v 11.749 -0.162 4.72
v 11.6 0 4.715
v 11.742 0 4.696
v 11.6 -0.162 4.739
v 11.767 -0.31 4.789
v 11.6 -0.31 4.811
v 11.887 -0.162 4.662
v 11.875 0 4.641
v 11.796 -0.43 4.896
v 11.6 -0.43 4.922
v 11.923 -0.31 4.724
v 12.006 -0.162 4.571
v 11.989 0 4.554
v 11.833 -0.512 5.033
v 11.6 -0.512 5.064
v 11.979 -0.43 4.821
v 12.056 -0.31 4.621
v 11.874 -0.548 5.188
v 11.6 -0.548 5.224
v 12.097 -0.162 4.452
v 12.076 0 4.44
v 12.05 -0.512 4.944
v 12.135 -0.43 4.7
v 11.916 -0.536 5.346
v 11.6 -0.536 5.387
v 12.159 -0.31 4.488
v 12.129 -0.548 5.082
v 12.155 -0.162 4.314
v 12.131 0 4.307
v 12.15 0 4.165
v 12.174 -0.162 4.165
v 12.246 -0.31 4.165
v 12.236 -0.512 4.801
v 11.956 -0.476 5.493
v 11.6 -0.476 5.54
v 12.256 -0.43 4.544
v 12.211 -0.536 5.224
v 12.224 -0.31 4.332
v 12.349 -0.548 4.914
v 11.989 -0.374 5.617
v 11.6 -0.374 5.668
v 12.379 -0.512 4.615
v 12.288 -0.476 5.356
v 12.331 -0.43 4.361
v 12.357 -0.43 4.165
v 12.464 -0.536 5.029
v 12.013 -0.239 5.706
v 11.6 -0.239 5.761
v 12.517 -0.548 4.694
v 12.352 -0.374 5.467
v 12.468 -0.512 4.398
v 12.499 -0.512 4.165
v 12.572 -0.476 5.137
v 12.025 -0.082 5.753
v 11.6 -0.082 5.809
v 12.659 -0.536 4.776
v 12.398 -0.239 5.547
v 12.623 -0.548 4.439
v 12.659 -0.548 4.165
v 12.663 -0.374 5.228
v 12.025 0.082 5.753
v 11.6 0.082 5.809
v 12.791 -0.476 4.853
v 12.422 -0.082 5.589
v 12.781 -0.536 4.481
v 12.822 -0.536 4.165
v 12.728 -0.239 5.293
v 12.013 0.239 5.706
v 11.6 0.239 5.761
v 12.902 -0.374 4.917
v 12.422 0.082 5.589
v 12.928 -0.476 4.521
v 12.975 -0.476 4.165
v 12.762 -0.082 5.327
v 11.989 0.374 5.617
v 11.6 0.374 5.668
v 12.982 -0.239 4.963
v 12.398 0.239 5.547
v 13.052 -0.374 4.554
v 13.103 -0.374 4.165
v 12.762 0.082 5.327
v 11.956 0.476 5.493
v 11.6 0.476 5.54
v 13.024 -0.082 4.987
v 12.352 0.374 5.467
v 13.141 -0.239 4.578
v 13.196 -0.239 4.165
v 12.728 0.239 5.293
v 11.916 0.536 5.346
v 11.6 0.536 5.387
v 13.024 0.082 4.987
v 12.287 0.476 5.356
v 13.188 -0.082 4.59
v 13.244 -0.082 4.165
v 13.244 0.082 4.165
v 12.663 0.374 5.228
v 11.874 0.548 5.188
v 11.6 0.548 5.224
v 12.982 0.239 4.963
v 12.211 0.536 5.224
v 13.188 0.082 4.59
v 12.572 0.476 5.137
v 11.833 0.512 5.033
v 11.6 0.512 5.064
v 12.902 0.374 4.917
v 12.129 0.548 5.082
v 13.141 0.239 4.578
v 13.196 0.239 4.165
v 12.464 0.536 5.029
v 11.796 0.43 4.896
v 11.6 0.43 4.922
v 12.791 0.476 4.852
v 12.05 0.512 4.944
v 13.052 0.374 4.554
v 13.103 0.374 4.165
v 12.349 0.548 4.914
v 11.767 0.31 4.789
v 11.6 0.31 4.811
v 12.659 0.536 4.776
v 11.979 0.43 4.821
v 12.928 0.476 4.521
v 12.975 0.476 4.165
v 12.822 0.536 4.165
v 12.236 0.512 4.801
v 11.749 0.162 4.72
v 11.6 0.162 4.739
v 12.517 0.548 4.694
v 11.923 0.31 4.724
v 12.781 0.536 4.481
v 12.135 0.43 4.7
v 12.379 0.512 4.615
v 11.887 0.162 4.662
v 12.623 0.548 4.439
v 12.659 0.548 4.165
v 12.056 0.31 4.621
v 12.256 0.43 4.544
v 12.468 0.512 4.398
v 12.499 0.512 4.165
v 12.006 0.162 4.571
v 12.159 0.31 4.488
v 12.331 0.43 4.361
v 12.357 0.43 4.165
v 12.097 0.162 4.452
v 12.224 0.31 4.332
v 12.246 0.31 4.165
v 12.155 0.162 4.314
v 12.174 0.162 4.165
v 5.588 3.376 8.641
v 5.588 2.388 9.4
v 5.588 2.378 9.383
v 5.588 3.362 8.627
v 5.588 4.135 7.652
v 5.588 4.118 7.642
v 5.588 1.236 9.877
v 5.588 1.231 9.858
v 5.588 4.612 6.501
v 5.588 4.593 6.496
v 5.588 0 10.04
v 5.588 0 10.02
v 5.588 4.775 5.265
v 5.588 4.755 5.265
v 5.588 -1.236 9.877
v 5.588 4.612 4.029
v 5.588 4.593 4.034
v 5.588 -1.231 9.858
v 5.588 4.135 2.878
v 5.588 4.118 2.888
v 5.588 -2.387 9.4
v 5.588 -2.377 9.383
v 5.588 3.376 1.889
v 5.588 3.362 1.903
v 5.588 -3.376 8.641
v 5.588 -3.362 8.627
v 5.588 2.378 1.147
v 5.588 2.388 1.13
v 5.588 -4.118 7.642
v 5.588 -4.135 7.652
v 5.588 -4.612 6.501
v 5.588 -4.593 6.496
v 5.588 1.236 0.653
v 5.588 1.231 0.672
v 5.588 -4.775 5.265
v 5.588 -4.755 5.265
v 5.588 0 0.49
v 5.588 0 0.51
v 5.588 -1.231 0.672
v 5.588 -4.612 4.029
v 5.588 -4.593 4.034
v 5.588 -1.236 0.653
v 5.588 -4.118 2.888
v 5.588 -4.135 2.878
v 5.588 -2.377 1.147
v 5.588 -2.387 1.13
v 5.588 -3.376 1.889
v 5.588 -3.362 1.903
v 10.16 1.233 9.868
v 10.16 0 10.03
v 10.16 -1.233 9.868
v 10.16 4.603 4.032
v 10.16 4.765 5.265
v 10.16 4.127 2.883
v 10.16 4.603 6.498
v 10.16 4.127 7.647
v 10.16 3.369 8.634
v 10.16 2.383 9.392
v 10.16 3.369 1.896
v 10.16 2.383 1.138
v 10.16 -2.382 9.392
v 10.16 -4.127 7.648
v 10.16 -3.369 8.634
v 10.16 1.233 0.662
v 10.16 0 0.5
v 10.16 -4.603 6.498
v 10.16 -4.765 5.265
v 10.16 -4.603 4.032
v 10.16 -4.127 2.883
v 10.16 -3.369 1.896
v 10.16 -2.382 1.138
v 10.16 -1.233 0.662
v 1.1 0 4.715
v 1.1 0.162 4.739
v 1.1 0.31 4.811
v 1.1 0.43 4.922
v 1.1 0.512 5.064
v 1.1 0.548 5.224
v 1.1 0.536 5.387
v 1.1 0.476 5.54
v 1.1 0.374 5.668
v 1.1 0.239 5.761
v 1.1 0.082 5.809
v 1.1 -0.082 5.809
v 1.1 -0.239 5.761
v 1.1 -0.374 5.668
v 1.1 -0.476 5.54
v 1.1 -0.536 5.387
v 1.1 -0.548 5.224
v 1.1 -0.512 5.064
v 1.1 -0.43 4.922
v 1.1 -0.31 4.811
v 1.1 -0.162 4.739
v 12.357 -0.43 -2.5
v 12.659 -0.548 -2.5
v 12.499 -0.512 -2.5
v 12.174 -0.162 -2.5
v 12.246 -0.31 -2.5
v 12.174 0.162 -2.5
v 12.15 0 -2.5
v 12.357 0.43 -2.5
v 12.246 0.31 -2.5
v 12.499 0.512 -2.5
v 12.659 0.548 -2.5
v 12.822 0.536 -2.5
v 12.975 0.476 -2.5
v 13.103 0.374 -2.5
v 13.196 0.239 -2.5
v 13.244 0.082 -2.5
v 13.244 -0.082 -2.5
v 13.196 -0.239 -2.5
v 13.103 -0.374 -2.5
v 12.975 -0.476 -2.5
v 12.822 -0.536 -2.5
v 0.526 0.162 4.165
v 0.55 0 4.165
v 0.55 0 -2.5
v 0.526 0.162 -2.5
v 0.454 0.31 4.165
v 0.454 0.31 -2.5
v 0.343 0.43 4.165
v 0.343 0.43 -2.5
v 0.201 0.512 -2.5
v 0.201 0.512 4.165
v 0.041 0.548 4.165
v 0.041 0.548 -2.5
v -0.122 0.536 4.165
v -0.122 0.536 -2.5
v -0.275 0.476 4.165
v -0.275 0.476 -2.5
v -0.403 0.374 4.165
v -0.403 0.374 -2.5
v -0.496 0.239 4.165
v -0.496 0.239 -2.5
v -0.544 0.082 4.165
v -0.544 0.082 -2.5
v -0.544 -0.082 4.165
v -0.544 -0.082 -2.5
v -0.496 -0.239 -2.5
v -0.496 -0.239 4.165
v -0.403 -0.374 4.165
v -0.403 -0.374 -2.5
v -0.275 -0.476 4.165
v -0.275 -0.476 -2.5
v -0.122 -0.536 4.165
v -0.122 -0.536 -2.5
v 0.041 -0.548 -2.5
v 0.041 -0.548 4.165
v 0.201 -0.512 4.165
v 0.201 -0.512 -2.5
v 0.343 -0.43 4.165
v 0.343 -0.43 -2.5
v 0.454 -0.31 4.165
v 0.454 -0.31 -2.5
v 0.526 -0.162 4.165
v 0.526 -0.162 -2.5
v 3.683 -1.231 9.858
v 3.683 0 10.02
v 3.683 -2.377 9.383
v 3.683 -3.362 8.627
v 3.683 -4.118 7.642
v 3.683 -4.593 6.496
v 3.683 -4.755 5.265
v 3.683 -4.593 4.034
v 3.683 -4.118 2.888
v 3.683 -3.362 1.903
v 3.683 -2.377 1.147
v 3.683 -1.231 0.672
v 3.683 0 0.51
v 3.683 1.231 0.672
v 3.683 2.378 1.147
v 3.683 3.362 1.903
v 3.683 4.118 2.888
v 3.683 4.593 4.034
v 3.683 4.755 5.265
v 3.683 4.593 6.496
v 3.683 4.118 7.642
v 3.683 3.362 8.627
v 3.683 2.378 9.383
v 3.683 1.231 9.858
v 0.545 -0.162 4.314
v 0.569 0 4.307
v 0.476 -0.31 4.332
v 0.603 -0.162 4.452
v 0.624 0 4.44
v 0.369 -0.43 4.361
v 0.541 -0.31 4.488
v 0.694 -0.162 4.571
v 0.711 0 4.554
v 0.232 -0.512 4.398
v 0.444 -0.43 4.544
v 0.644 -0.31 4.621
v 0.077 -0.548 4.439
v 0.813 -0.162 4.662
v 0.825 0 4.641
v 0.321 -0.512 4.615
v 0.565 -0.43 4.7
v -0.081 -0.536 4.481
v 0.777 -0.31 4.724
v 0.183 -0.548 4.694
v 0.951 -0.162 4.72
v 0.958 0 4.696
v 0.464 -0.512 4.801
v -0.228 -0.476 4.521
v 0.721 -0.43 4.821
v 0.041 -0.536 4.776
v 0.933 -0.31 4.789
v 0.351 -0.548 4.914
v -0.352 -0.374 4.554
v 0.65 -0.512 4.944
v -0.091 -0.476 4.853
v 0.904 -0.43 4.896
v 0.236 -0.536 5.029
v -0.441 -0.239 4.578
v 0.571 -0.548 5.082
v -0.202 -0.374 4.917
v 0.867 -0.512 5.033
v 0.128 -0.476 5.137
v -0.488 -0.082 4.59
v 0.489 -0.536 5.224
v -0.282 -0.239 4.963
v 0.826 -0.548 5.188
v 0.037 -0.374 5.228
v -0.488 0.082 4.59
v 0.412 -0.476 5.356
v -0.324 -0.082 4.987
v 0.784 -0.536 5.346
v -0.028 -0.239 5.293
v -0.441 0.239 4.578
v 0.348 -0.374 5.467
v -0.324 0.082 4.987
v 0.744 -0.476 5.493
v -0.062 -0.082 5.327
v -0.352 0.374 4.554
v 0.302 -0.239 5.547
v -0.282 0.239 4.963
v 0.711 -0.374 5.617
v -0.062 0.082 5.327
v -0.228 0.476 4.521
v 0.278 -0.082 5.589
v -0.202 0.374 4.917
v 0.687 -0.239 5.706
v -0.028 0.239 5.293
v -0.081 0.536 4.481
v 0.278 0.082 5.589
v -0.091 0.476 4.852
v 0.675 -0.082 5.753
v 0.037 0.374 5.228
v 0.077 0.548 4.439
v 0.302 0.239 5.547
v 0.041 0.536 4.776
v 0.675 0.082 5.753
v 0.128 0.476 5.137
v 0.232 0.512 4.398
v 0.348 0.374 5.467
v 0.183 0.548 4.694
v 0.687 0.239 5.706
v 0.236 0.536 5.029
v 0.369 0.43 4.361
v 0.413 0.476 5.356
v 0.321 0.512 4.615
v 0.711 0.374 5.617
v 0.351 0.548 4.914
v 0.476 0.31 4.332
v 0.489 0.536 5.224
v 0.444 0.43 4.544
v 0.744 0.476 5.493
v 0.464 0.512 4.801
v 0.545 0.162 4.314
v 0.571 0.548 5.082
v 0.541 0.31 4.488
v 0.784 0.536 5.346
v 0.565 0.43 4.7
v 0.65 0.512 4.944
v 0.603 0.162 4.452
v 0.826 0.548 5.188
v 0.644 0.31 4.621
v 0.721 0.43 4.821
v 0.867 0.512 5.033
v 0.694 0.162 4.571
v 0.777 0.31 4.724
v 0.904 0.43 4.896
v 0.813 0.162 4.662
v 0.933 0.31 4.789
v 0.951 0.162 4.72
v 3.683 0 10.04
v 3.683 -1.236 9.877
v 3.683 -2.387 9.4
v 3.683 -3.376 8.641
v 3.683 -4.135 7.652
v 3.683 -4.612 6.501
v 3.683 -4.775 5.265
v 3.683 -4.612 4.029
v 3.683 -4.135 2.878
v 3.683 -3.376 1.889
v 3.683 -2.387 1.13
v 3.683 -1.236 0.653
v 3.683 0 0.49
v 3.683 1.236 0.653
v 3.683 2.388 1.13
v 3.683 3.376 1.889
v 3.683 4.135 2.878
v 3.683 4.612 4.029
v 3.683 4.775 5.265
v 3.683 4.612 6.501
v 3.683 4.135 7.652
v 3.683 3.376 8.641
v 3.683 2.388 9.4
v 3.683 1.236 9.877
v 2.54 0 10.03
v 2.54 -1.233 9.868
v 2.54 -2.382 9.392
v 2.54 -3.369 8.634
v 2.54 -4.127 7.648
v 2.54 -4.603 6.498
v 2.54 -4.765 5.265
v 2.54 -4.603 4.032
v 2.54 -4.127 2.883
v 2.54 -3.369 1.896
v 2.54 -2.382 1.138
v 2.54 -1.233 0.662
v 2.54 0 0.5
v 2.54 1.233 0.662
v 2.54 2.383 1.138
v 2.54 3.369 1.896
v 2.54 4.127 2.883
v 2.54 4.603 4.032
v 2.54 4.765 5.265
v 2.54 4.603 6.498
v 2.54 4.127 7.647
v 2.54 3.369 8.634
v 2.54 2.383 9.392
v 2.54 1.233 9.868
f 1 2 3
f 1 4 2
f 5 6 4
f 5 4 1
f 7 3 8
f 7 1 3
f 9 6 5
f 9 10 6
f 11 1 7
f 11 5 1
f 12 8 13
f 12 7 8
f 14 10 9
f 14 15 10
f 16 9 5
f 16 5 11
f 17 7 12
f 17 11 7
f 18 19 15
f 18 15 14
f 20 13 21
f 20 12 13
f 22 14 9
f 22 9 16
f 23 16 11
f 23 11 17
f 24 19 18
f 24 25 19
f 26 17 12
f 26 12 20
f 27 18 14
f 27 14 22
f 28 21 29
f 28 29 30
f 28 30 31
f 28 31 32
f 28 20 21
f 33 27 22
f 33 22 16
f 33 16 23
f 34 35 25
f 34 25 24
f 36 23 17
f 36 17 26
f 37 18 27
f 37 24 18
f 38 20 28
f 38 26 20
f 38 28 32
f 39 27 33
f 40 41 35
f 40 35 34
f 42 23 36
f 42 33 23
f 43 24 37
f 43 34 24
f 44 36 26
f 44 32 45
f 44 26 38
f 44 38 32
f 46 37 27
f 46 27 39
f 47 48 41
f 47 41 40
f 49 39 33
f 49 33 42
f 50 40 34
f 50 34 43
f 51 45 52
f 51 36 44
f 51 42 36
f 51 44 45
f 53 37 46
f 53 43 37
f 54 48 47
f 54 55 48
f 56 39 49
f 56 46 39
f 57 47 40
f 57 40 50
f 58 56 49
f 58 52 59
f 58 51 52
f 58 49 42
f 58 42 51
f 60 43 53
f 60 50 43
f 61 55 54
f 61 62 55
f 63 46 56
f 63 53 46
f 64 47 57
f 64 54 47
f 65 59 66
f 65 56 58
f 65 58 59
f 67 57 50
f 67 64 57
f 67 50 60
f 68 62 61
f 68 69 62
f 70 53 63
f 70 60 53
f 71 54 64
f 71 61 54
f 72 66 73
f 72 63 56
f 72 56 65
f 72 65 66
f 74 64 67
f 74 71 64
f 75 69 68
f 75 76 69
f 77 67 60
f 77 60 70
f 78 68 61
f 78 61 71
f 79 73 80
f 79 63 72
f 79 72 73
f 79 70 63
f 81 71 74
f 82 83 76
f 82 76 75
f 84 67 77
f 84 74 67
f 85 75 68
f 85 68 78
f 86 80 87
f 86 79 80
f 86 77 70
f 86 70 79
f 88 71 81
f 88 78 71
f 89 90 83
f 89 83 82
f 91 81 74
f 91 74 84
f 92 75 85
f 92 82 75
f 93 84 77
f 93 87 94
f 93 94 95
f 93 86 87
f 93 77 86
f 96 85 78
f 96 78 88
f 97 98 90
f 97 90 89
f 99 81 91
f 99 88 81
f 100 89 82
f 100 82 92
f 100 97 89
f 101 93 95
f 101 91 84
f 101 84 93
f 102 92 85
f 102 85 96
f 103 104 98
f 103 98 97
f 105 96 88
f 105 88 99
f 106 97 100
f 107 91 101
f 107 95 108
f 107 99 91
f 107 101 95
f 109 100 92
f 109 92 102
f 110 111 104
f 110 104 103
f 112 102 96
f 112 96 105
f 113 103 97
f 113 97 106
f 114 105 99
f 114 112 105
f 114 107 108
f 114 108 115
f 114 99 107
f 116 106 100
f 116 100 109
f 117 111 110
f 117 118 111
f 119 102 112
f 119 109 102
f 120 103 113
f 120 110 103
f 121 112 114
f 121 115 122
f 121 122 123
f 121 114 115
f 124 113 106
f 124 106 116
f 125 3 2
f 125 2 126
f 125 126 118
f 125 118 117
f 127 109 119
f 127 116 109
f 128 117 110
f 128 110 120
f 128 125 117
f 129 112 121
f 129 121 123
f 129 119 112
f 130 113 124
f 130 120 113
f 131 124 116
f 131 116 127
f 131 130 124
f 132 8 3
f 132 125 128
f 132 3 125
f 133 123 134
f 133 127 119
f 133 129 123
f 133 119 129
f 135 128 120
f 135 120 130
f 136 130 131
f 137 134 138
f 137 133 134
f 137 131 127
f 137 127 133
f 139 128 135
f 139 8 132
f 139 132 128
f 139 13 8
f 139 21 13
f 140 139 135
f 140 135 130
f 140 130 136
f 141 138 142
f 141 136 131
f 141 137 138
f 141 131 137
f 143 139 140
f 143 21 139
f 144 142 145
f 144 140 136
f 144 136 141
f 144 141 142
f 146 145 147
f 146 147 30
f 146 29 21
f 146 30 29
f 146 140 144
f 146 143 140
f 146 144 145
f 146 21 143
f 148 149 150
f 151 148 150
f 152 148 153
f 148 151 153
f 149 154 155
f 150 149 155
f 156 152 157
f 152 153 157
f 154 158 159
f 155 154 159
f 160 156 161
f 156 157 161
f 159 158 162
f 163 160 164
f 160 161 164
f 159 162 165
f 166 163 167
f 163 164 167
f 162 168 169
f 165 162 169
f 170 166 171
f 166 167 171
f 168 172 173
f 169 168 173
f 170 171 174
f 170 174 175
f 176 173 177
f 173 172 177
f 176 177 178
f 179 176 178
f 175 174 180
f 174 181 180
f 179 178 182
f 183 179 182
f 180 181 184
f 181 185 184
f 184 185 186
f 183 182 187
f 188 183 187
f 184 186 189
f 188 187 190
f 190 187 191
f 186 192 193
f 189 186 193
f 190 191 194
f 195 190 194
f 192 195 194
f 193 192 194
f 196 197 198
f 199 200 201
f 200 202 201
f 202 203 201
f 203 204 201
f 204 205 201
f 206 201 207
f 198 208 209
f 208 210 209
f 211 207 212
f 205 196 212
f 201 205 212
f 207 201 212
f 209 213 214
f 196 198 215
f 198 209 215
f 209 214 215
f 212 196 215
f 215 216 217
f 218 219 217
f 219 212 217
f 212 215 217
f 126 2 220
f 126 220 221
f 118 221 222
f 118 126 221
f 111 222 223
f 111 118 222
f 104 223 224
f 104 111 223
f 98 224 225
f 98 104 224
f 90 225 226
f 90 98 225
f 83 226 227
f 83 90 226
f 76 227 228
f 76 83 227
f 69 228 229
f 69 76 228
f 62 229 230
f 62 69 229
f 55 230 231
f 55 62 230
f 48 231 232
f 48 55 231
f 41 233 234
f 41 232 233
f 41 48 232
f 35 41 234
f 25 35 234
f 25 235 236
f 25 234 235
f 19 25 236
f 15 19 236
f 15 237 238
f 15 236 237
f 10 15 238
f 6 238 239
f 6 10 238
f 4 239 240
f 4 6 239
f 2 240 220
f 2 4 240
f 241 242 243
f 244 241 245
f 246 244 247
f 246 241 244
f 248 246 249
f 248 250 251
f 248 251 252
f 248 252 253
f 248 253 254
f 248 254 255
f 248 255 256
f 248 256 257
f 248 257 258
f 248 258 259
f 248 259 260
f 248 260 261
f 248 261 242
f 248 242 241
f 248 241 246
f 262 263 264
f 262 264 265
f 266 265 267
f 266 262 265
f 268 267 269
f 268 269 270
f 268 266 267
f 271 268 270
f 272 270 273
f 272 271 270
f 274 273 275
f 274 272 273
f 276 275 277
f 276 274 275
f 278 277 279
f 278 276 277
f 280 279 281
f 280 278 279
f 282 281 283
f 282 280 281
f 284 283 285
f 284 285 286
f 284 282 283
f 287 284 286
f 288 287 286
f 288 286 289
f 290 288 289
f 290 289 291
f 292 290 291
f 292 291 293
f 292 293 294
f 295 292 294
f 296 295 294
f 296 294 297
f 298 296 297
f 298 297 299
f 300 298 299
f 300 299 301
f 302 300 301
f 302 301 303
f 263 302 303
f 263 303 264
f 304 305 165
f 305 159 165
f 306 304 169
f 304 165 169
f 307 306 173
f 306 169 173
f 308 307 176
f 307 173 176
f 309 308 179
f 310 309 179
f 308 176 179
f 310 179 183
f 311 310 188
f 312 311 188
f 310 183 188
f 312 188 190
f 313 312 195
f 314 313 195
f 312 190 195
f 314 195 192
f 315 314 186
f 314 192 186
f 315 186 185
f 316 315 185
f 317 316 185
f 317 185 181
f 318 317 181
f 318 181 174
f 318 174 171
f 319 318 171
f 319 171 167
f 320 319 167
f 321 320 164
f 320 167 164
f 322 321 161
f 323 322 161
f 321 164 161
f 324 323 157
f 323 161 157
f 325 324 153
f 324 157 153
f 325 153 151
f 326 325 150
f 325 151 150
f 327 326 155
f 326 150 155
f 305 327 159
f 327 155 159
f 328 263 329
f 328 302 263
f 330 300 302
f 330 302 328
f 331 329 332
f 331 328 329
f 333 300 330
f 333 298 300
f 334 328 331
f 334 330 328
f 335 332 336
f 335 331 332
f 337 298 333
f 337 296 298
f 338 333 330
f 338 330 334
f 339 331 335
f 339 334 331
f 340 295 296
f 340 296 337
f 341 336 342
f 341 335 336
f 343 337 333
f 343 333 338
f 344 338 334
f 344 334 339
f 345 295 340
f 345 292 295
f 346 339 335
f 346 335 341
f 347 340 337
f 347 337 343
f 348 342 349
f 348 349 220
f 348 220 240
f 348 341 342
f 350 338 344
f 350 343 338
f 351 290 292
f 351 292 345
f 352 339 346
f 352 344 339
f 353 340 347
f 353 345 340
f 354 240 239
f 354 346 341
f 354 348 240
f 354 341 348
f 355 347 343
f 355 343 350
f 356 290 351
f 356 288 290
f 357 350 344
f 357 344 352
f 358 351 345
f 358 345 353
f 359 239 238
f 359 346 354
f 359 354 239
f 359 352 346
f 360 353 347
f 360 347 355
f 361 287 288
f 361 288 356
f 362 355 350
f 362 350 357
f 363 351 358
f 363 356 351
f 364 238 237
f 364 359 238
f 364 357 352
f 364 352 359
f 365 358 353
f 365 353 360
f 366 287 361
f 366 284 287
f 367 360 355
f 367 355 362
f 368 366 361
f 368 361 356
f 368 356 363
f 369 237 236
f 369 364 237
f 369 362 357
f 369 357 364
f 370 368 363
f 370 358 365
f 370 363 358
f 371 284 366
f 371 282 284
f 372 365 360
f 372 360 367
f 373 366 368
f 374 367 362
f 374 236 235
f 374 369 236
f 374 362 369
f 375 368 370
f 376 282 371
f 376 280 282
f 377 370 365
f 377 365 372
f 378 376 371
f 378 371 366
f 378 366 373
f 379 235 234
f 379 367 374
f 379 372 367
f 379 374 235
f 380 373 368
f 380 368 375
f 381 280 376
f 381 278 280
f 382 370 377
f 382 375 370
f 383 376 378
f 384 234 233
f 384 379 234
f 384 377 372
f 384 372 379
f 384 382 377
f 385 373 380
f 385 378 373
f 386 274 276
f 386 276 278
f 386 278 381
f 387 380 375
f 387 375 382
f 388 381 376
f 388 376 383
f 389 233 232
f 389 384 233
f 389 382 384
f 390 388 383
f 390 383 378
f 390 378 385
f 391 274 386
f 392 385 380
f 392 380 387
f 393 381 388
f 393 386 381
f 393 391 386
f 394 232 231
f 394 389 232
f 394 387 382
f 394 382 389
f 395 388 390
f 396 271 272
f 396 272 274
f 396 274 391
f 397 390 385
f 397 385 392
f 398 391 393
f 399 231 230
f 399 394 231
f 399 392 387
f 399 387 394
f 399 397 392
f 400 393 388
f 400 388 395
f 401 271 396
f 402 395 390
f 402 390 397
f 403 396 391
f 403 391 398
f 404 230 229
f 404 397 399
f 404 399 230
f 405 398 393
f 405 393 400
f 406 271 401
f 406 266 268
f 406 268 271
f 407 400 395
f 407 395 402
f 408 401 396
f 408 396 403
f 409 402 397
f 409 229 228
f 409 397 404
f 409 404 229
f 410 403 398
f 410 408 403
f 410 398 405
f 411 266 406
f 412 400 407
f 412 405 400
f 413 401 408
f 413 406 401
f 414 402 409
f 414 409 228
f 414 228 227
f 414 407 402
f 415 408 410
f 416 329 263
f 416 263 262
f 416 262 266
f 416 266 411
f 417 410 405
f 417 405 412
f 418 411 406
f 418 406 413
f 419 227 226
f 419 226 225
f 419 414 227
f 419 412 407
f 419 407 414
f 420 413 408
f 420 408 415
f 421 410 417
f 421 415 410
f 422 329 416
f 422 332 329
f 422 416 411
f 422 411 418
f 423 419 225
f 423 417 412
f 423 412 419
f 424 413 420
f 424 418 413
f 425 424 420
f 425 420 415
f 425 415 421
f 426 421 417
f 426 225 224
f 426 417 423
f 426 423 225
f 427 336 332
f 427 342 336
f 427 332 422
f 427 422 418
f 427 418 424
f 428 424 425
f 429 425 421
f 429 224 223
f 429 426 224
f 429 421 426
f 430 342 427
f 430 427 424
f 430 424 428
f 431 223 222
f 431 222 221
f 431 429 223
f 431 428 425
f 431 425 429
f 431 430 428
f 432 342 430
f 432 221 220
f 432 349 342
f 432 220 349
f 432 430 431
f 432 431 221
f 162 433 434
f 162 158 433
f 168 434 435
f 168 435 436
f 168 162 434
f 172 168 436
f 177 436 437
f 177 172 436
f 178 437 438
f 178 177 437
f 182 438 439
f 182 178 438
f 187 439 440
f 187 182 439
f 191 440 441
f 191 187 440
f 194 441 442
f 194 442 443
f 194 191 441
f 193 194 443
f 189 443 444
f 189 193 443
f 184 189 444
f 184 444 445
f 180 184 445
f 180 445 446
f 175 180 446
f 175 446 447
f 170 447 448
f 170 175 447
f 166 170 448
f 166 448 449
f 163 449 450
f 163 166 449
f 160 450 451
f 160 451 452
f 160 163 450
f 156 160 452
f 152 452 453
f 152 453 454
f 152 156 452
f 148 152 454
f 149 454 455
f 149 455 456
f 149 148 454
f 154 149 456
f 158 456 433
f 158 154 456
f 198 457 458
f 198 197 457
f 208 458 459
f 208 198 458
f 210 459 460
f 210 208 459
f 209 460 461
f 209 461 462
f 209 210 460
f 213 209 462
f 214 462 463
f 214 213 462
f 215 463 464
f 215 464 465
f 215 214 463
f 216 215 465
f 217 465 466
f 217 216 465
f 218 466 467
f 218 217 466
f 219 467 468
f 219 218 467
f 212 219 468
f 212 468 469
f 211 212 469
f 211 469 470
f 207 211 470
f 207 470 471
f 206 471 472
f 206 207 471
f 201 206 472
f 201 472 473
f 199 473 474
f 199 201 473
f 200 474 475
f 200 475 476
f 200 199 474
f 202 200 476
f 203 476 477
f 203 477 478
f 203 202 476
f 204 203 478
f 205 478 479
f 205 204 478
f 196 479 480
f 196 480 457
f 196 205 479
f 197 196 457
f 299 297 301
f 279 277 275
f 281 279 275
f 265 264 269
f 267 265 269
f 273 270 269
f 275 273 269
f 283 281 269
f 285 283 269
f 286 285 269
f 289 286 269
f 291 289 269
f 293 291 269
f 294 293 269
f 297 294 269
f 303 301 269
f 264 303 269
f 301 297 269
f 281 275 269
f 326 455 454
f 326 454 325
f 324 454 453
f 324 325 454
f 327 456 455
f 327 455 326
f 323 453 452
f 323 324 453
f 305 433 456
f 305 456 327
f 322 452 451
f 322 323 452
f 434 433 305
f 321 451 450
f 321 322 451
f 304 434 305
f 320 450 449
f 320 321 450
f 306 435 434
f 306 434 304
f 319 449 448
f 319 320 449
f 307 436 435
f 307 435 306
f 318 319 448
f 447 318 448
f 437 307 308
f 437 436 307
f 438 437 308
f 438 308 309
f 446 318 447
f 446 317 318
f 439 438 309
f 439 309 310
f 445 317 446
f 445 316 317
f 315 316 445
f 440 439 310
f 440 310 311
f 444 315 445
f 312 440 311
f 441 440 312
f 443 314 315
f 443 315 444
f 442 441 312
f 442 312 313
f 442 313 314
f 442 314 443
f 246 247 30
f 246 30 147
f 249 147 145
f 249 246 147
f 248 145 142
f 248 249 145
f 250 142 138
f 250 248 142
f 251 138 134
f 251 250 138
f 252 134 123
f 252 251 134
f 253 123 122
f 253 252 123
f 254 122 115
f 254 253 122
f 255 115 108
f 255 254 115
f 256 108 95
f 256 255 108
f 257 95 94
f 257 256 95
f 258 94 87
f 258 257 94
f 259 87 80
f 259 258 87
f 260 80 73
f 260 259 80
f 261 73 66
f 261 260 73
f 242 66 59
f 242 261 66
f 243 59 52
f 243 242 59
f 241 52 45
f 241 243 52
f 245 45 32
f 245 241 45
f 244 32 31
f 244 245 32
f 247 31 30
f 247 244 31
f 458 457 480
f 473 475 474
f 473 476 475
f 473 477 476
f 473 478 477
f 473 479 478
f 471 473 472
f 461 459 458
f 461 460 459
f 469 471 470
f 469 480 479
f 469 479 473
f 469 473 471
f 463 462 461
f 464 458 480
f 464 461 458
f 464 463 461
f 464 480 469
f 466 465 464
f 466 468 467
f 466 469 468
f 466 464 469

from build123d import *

# Parameters (mm, degrees)
SKETCH002_W = 7.62
SKETCH002_H = 4.765
SKETCH003_W = 1.905
SKETCH003_H = 0.02
SKETCH_R    = 0.55


with BuildPart() as revolution:
    # Sketch002 → Revolution (revolve)
    with BuildSketch(Plane.XZ):
        with Locations((6.35, 7.6475)):
            Rectangle(SKETCH002_W, SKETCH002_H)
    revolve(axis=Axis((2.54, 0, 5.265), (1, 0, 0)))


with BuildPart() as revolution001:
    # Sketch003 → Revolution001 (revolve)
    with BuildSketch(Plane.XZ):
        with Locations((4.6355, 10.03)):
            Rectangle(SKETCH003_W, SKETCH003_H)
    revolve(axis=Axis((0, 0, 5.265), (1, 0, 0)))


with BuildPart() as sweep_body:
    # Sweep: sweep along a path in Sketch001
    with BuildLine(Plane.XZ) as sweep_path:
        Line((0, -2.5), (0, 4.165))
        ThreePointArc((0, 4.165), (0.322183, 4.942817), (1.1, 5.265))
        Line((1.1, 5.265), (11.6, 5.265))
        ThreePointArc((11.6, 5.265), (12.377817, 4.942817), (12.7, 4.165))
        Line((12.7, 4.165), (12.7, -2.5))
    # Sketch → Sweep (sweep)
    with BuildSketch(Plane.XY.offset(-2)):
        Circle(SKETCH_R)
    sweep(path=sweep_path.line)


solid = Compound([revolution.part, revolution001.part, sweep_body.part])
